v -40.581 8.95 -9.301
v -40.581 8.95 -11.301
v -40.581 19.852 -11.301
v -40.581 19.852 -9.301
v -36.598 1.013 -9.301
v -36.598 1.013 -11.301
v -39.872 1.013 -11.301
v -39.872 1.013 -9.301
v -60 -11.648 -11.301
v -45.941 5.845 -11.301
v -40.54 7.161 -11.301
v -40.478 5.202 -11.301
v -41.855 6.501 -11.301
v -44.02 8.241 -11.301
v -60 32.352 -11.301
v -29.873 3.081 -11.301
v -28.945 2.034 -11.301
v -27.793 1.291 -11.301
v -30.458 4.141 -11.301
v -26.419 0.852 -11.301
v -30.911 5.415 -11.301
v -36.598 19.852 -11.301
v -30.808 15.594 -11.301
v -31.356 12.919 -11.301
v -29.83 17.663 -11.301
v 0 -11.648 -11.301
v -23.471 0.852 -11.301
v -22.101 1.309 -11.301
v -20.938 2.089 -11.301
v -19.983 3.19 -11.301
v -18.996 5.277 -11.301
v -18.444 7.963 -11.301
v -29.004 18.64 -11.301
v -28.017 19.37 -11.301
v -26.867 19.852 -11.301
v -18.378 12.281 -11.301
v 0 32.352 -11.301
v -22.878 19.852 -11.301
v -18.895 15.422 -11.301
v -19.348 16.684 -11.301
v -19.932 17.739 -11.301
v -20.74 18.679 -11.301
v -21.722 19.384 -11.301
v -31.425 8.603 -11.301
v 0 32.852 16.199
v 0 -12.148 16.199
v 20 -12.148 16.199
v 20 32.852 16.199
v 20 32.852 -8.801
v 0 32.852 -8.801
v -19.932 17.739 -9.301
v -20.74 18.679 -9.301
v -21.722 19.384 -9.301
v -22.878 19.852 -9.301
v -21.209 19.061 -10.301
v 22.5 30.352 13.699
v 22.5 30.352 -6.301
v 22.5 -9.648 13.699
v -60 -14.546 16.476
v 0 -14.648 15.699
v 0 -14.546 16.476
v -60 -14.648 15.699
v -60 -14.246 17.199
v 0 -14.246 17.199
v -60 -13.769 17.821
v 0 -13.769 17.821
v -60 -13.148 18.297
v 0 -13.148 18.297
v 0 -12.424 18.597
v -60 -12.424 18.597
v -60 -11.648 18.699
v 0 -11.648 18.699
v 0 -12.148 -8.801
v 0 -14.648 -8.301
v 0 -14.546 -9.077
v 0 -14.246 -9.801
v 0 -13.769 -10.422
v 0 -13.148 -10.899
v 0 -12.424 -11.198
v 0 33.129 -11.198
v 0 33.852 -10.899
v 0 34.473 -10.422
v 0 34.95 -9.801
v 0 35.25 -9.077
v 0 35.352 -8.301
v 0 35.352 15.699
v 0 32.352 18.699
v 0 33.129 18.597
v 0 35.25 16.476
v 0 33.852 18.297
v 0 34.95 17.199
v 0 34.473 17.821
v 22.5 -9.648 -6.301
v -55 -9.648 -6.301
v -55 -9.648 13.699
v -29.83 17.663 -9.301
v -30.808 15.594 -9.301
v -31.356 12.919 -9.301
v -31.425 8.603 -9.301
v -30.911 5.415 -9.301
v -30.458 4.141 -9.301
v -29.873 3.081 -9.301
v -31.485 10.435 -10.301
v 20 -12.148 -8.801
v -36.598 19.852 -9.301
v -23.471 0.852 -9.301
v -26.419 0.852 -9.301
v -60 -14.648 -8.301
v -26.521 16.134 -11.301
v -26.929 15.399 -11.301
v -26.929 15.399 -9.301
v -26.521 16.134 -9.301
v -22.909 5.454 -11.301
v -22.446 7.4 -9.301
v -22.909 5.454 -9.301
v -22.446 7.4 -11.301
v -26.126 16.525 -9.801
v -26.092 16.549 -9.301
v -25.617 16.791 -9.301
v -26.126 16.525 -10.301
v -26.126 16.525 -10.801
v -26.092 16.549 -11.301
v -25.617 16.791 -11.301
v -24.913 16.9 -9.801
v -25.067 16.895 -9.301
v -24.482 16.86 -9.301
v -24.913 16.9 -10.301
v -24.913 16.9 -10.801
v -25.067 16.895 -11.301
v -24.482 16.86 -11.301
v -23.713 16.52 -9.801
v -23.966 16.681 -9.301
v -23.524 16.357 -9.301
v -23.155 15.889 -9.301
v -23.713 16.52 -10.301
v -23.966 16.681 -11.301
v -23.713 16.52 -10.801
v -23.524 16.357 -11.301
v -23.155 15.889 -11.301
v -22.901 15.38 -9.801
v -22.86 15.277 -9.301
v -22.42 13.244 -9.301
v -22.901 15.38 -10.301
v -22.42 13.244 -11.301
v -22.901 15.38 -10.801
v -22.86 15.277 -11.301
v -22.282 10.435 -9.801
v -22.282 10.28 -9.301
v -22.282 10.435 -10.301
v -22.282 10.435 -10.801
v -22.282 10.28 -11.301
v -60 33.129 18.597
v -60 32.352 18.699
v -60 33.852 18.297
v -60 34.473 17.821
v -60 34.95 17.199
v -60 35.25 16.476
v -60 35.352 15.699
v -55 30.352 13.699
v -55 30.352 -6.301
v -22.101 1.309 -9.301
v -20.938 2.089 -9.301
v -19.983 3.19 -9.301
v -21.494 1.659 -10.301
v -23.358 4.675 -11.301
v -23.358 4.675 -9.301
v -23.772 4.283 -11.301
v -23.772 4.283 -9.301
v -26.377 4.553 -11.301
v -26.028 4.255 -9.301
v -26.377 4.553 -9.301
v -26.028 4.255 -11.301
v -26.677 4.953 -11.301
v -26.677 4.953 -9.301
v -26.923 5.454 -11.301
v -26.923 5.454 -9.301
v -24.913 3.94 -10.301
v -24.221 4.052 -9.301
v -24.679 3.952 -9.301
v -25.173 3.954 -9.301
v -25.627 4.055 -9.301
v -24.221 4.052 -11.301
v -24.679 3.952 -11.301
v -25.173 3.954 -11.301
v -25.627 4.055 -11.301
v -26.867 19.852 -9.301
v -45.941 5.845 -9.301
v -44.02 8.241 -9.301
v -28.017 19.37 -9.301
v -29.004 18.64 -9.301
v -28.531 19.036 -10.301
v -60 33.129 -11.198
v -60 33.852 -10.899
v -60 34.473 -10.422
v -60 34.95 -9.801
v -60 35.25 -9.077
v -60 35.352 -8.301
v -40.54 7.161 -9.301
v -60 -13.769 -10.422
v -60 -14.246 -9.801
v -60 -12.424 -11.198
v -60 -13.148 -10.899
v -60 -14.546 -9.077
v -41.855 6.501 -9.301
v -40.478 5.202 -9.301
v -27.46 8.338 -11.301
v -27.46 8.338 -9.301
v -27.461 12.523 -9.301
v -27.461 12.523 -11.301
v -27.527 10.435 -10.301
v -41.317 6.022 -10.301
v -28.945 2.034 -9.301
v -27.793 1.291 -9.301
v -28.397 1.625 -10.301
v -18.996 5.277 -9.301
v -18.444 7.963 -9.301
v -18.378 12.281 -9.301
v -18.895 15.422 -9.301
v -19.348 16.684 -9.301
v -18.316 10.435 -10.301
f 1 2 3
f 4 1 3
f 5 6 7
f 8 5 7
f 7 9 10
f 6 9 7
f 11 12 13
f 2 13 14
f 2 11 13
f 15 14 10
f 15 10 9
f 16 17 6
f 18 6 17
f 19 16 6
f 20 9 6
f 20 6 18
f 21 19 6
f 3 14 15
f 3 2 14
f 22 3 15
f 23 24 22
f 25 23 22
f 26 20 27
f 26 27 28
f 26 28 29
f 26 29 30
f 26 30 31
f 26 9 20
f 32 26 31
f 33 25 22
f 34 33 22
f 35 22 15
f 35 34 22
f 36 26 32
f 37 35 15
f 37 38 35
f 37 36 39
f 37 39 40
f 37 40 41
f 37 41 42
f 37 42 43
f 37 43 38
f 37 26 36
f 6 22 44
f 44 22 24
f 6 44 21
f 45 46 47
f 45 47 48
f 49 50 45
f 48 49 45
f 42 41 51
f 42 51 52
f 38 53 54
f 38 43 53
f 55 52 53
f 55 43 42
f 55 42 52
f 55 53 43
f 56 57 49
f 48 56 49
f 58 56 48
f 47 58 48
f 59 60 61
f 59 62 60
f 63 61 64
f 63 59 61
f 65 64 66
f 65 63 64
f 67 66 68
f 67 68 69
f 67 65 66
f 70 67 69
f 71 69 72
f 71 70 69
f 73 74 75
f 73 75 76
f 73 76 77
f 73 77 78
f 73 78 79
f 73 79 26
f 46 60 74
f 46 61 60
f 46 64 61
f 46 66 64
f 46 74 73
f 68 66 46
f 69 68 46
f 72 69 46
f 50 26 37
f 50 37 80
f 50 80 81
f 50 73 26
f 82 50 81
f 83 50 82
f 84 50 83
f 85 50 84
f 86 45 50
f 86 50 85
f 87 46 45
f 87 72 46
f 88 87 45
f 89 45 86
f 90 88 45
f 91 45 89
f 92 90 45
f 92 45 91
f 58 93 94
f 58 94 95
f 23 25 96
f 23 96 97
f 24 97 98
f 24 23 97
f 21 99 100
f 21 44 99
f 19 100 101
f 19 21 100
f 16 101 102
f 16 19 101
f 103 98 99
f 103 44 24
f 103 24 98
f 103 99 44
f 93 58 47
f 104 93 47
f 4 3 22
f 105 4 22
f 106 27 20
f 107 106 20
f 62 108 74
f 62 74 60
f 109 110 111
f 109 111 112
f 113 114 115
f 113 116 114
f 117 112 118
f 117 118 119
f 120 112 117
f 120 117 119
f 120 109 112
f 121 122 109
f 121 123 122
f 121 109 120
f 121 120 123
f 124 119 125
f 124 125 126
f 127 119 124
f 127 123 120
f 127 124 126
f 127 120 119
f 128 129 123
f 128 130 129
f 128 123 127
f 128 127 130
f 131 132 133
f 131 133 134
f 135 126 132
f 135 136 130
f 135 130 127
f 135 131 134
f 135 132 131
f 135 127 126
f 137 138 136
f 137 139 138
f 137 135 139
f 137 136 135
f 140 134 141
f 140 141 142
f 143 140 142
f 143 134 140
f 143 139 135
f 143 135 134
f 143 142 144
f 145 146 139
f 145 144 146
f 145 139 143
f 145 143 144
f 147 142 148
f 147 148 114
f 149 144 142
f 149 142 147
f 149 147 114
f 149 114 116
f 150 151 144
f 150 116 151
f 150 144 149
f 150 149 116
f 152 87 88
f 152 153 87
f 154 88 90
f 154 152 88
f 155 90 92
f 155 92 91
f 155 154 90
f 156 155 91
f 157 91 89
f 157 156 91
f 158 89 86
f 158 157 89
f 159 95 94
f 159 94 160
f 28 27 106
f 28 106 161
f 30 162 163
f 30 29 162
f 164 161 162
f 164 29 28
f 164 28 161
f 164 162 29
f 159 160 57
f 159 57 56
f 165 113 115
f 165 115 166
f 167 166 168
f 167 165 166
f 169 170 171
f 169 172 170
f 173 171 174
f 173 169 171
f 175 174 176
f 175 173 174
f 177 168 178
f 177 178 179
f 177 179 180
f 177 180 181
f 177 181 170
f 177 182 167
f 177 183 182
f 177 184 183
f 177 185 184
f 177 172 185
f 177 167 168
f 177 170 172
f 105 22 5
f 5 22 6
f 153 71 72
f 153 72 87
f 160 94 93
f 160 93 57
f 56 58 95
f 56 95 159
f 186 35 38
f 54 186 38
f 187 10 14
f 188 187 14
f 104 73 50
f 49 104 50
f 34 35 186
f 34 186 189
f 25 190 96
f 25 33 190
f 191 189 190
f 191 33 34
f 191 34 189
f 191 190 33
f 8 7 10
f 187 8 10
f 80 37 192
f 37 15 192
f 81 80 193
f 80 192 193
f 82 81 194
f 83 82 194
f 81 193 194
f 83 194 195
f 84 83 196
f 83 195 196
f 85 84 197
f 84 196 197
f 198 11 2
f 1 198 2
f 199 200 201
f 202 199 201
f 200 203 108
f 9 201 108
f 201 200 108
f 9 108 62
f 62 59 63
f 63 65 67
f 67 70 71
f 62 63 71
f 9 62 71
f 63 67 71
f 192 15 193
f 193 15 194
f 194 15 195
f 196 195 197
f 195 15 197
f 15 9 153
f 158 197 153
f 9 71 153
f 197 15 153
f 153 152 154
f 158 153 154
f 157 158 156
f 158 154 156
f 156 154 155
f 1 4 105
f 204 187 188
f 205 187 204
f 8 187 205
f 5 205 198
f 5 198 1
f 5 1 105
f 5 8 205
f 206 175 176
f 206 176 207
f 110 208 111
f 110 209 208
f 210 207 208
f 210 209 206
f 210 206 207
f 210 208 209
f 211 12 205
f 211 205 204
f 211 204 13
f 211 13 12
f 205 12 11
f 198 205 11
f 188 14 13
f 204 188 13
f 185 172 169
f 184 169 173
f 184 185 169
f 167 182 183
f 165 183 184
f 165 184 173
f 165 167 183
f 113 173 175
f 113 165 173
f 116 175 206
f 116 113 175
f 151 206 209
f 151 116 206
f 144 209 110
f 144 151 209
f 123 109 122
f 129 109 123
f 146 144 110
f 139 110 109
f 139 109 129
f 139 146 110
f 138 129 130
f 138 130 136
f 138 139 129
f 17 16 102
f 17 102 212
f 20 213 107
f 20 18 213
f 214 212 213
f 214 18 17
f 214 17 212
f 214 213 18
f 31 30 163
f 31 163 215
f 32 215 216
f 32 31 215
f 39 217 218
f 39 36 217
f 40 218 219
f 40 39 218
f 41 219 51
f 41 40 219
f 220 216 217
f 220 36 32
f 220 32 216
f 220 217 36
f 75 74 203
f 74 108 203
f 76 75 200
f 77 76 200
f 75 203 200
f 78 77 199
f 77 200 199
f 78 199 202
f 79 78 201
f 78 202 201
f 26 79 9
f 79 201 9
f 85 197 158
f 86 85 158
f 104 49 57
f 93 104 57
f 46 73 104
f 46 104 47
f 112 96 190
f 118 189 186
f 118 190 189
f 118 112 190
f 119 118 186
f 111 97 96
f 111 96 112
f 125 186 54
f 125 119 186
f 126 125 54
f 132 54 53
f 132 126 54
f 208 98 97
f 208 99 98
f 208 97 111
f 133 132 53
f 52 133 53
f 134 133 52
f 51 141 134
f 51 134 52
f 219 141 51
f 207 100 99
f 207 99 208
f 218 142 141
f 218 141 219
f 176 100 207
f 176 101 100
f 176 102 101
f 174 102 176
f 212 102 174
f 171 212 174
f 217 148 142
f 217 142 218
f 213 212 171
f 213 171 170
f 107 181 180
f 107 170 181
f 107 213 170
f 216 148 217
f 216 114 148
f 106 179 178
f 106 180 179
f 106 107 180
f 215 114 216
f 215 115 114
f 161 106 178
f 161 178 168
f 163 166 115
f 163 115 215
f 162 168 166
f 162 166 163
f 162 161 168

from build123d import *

# Parameters (mm, degrees)
F0_W        = 49.9999988824
F0_H        = 29.9999988824
F0_W_2      = 45.0000008941
F0_H_2      = 25.0000008941
F0_W_3      = 40
F0_H_3      = 20
F1_DEPTH    = 60
F2_DEPTH    = 55
F3_DEPTH    = 25
F4_T1_DEPTH = 50.7168307737
F4_T3_DEPTH = 70.7168307737
F5_R        = 3
F7_DEPTH    = 2


# Not quite as in the source:
# - a fillet or chamfer that OpenCascade refuses, or shapes differently, is made with other operations: its cross-section is extruded or revolved along the edge and cut away or added


with BuildPart() as f1:
    # F0 (on Right) → F1 (new body)
    with BuildSketch(Plane.YZ):
        with Locations((10.3521584719, 3.6993094161)):
            Rectangle(F0_W, F0_H)
        with Locations((10.3521584719, 3.6993094161)):
            Rectangle(F0_W_2, F0_H_2, mode=Mode.SUBTRACT)
        with Locations((10.3521584719, 3.6993094161)):
            Rectangle(F0_W_2, F0_H_2)
        with Locations((10.3521584719, 3.6993094161)):
            Rectangle(F0_W_3, F0_H_3, mode=Mode.SUBTRACT)
        with Locations((10.3521584719, 3.6993094161)):
            Rectangle(F0_W_3, F0_H_3)
    extrude(amount=-F1_DEPTH)

    # F0 (on Right) → F2 (cut)
    with BuildSketch(Plane.YZ):
        with Locations((10.3521584719, 3.6993094161)):
            Rectangle(F0_W_3, F0_H_3)
    extrude(amount=-F2_DEPTH, mode=Mode.SUBTRACT)

    # F0 (on Right) → F3 (join)
    with BuildSketch(Plane.YZ):
        with Locations((10.3521584719, 3.6993094161)):
            Rectangle(F0_W_2, F0_H_2)
        with Locations((10.3521584719, 3.6993094161)):
            Rectangle(F0_W_3, F0_H_3, mode=Mode.SUBTRACT)
    extrude(amount=F3_DEPTH)

    # F4: chamfer of 5 on 4 edges, made by hand

    # F4_s2 → F4_t1 (cut)
    with BuildSketch(Plane.XY.offset(-21.6591059707)):
        Polygon((25, -7.1478419751), (20, -12.1478419751), (25, -12.1478419751), align=None)
        Polygon((25, 27.852158919), (20, 32.852158919), (25, 32.852158919), align=None)
    extrude(amount=F4_T1_DEPTH, mode=Mode.SUBTRACT)

    # F4_s4 → F4_t3 (cut)
    with BuildSketch(Plane.XZ.offset(-45.7105738588)):
        Polygon((20, -8.8006910309), (25, -3.8006910309), (25, -8.8006910309), align=None)
        Polygon((25, 11.1993098632), (20, 16.1993098632), (25, 16.1993098632), align=None)
    extrude(amount=F4_T3_DEPTH, mode=Mode.SUBTRACT)

    # F5
    f5_edges = [f1.edges().sort_by_distance(p)[0] for p in [
        (-30, 35.352158, -11.30069),
        (-30, 35.352158, 18.699309),
        (-30, -14.647841, -11.30069),
        (-30, -14.647841, 18.699309),
    ]]
    fillet(f5_edges, radius=F5_R)

    # F6 (on face) → F7 (cut)
    with BuildSketch(Plane(origin=(0, 0, -11.3006900251), x_dir=(1, 0, 0), z_dir=(0, 0, -1))):
        with BuildLine():
            Line((-40.5811635508, -19.8521577269), (-36.5980909465, -19.8521577269))
            Line((-36.5980909465, -19.8521577269), (-36.5980909465, -1.0129664961))
            Line((-36.5980909465, -1.0129664961), (-39.8719622175, -1.0129664961))
            Line((-39.8719622175, -1.0129664961), (-45.941406186, -5.8454313948))
            Line((-45.941406186, -5.8454313948), (-44.0199653644, -8.2410475264))
            Line((-44.0199653644, -8.2410475264), (-41.8552519925, -6.5010303018))
            add(Edge.make_bspline(
                [(-40.4780819617, -5.2022022786), (-41.4676652174, -6.1917855343), (-41.8552519925, -6.5010303018)],
                knots=[0, 0, 0, 1, 1, 1], degree=2))
            Line((-40.4780819617, -5.2022022786), (-40.5399309151, -7.1607524722))
            Line((-40.5399309151, -7.1607524722), (-40.5811635508, -8.9502488597))
            Line((-40.5811635508, -8.9502488597), (-40.5811635508, -19.8521577269))
        make_face()
        with BuildLine():
            Line((-26.8667704258, -19.8521577269), (-22.8777154217, -19.8521577269))
            add(Edge.make_bspline(
                [(-19.9318596147, -17.7389851496), (-21.0133994036, -19.326806957), (-22.8777154217, -19.8521577269)],
                knots=[0, 0, 0, 0.6691374514, 0.6691374514, 0.6691374514], degree=2))
            add(Edge.make_bspline(
                [(-18.315540297, -10.4346237433), (-18.315540297, -15.3660469676), (-19.9318596147, -17.7389851496)],
                knots=[0, 0, 0, 1, 1, 1], degree=2))
            add(Edge.make_bspline(
                [(-19.9834004093, -3.1900496586), (-18.315540297, -5.664007798), (-18.315540297, -10.4346237433)],
                knots=[0, 0, 0, 1, 1, 1], degree=2))
            add(Edge.make_bspline(
                [(-23.4706324827, -0.852159217), (-21.2601126538, -1.2962861316), (-19.9834004093, -3.1900496586)],
                knots=[0.234520788, 0.234520788, 0.234520788, 1, 1, 1], degree=2))
            Line((-23.4706324827, -0.852159217), (-26.4191418917, -0.852159217))
            add(Edge.make_bspline(
                [(-29.8730480712, -3.0807831742), (-28.6475822393, -1.2833288146), (-26.4191418917, -0.852159217)],
                knots=[0, 0, 0, 0.7601220886, 0.7601220886, 0.7601220886], degree=2))
            add(Edge.make_bspline(
                [(-31.4852441253, -10.4346237433), (-31.4852441253, -5.445474829), (-29.8730480712, -3.0807831742)],
                knots=[0, 0, 0, 1, 1, 1], degree=2))
            add(Edge.make_bspline(
                [(-29.8297538037, -17.6627047736), (-31.4852441253, -15.2134862157), (-31.4852441253, -10.4346237433)],
                knots=[0, 0, 0, 1, 1, 1], degree=2))
            add(Edge.make_bspline(
                [(-26.8667704258, -19.8521577269), (-28.7134061438, -19.3142876129), (-29.8297538037, -17.6627047736)],
                knots=[0.3256694736, 0.3256694736, 0.3256694736, 1, 1, 1], degree=2))
        make_face()
        with BuildLine():
            add(Edge.make_bspline(
                [(-27.5269111024, -10.4346237433), (-27.5269111024, -13.8981651383), (-26.9290378854, -15.3990330761)],
                knots=[0, 0, 0, 1, 1, 1], degree=2))
            add(Edge.make_bspline(
                [(-26.92285299, -5.4537213561), (-27.5269111024, -6.9669590847), (-27.5269111024, -10.4346237433)],
                knots=[0, 0, 0, 1, 1, 1], degree=2))
            add(Edge.make_bspline(
                [(-24.9127620019, -3.9404836276), (-26.3187948777, -3.9404836276), (-26.92285299, -5.4537213561)],
                knots=[0, 0, 0, 1, 1, 1], degree=2))
            add(Edge.make_bspline(
                [(-22.908855909, -5.4537213561), (-23.535591971, -3.9404836276), (-24.9127620019, -3.9404836276)],
                knots=[0, 0, 0, 1, 1, 1], degree=2))
            add(Edge.make_bspline(
                [(-22.2821198471, -10.4346237433), (-22.2821198471, -6.9669590847), (-22.908855909, -5.4537213561)],
                knots=[0, 0, 0, 1, 1, 1], degree=2))
            add(Edge.make_bspline(
                [(-22.9006093819, -15.3804783901), (-22.2821198471, -13.8610557662), (-22.2821198471, -10.4346237433)],
                knots=[0, 0, 0, 1, 1, 1], degree=2))
            add(Edge.make_bspline(
                [(-24.9127620019, -16.899901014), (-23.5190989167, -16.899901014), (-22.9006093819, -15.3804783901)],
                knots=[0, 0, 0, 1, 1, 1], degree=2))
            add(Edge.make_bspline(
                [(-26.9290378854, -15.3990330761), (-26.3311646684, -16.899901014), (-24.9127620019, -16.899901014)],
                knots=[0, 0, 0, 1, 1, 1], degree=2))
        make_face(mode=Mode.SUBTRACT)
    extrude(amount=-F7_DEPTH, mode=Mode.SUBTRACT)


solid = f1.part
